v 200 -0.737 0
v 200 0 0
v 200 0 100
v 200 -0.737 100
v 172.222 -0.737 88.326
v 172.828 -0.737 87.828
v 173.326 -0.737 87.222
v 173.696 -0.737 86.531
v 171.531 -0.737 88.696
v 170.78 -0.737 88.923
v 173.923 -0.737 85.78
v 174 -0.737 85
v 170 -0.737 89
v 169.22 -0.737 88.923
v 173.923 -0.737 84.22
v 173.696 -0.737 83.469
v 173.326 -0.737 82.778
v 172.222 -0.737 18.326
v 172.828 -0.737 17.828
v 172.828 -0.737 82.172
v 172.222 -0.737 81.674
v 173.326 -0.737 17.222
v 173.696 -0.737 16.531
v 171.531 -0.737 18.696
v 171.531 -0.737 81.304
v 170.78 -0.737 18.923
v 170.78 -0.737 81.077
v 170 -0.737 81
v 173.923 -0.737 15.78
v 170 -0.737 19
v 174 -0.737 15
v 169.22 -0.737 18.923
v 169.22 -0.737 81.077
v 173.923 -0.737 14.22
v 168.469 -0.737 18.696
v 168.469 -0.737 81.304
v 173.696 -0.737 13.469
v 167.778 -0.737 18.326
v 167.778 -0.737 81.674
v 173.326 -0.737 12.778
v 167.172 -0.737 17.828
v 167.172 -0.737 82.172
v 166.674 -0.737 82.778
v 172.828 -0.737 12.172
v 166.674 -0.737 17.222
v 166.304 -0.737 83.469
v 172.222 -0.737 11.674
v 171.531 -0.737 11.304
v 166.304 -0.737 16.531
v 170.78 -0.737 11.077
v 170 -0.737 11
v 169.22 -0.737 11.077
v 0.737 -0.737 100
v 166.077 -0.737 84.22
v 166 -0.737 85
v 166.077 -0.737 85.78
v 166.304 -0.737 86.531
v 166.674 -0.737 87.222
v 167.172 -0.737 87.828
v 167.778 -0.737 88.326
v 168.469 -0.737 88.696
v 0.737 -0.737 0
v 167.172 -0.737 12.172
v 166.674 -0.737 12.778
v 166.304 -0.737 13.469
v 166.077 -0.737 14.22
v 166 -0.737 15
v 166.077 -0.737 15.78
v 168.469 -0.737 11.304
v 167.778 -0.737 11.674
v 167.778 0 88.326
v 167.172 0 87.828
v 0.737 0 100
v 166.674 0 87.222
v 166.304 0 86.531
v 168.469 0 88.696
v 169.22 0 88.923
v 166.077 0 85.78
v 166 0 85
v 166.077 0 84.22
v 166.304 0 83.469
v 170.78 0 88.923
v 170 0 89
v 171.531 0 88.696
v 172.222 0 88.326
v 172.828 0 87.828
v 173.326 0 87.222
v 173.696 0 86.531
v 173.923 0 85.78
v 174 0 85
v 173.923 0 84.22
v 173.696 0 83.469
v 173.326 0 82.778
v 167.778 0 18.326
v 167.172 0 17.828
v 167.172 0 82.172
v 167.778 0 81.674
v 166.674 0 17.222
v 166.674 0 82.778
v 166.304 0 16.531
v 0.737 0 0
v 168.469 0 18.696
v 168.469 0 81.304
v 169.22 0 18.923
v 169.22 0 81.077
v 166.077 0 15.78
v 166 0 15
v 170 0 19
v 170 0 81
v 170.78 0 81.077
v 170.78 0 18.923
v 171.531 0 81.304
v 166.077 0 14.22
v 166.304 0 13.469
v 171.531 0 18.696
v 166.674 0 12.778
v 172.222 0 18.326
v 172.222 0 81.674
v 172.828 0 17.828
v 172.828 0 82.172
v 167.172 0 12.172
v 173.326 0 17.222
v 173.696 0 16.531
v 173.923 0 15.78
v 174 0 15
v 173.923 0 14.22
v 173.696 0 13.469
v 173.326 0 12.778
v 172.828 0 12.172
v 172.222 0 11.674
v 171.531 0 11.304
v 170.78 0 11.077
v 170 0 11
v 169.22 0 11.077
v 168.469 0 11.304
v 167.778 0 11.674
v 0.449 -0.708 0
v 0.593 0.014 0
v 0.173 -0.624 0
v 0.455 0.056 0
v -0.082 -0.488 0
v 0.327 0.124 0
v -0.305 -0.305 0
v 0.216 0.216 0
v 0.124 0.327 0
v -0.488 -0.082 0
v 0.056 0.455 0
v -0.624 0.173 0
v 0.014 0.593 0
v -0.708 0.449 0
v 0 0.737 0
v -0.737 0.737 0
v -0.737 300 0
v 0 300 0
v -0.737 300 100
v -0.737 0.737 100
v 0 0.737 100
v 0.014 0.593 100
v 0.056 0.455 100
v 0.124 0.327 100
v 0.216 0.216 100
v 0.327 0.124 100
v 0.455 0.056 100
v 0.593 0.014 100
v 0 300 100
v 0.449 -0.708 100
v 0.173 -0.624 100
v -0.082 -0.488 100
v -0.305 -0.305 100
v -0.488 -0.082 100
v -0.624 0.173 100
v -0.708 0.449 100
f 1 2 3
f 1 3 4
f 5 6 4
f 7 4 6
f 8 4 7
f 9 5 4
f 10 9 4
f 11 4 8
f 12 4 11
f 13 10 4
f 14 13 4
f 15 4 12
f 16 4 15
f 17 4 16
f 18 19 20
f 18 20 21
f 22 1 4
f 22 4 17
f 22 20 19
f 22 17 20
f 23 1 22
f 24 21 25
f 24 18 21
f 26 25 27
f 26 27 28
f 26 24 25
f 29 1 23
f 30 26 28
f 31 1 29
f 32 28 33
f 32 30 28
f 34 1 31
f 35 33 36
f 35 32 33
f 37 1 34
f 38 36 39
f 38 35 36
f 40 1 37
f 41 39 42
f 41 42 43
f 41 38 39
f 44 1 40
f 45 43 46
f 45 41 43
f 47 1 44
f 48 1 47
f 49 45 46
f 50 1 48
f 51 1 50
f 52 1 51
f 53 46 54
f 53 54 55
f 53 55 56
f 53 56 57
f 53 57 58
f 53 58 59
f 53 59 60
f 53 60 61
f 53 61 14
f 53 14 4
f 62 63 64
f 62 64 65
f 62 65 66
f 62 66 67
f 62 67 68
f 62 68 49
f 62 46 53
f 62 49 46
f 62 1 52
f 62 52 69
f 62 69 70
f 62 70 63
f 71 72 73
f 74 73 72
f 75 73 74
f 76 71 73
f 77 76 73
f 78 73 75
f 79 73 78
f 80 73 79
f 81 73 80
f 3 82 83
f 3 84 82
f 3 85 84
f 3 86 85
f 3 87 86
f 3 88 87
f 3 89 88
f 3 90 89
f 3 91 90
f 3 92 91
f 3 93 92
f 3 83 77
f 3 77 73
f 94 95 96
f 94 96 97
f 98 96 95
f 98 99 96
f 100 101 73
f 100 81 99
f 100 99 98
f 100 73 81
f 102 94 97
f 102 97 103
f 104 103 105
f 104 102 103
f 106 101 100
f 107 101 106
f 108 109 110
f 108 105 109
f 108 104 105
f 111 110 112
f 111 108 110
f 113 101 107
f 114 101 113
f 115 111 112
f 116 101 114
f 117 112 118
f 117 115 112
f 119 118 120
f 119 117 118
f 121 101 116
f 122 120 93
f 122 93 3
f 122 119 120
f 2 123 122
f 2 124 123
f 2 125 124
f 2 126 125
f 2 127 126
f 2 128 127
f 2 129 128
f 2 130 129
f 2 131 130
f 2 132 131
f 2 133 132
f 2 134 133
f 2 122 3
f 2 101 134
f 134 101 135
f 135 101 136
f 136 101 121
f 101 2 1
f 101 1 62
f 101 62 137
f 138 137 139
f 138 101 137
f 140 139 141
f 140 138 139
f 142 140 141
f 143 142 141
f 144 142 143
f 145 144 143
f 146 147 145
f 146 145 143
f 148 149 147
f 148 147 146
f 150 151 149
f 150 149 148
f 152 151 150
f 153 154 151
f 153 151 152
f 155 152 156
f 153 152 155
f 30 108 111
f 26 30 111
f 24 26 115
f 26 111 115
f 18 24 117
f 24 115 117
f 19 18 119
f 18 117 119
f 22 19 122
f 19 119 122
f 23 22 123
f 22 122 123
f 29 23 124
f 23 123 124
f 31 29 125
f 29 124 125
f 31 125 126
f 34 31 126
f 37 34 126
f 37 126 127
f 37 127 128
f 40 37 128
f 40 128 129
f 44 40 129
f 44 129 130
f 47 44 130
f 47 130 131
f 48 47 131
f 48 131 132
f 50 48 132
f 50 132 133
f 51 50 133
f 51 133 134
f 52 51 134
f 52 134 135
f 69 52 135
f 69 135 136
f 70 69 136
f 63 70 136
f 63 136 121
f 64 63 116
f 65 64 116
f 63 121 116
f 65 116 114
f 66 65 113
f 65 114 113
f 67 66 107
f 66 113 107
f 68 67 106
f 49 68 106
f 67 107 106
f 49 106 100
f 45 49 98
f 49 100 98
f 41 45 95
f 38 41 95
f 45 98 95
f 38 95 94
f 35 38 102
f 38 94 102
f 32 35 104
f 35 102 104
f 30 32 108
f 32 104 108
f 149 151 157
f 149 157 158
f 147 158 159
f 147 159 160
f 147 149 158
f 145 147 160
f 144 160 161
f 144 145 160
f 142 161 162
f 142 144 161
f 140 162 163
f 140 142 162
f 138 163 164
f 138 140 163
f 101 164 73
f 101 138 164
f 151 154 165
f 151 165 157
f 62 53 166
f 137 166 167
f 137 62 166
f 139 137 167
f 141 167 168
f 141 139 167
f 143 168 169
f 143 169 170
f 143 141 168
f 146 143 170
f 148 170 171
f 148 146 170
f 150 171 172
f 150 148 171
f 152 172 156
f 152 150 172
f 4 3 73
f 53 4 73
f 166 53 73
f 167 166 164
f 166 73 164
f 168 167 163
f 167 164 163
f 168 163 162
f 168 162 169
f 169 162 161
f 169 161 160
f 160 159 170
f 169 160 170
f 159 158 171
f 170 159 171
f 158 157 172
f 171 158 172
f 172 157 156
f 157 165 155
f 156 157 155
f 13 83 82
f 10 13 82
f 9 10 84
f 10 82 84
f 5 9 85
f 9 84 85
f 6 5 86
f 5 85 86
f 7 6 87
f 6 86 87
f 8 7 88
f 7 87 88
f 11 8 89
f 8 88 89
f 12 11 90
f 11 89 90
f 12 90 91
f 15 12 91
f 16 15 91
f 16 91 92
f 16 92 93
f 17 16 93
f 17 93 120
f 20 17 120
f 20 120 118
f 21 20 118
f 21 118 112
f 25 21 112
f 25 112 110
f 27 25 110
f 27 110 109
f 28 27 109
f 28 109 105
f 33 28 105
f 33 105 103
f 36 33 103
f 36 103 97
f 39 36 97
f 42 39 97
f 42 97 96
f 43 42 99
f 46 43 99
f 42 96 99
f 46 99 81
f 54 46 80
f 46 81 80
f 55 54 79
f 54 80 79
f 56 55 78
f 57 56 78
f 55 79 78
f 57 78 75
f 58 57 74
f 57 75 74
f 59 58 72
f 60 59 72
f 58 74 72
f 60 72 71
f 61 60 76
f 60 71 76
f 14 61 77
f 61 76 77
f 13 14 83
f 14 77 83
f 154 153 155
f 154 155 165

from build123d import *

# Parameters (mm, degrees)
BASE_FLANGE1_DEPTH = 100
SKETCH6_R          = 4
CUT_EXTRUDE1_DEPTH = 10


# Sheet-metal steps are written as plain solids
with BuildPart() as part:
    # Sketch1 → Base-Flange1 (new body)
    with BuildSketch(Plane.XY):
        with BuildLine():
            Line((0, 300), (0, 0.7366))
            ThreePointArc((0, 0.7366), (0.215745145, 0.215745145), (0.7366, 0))
            Line((0.7366, 0), (200, 0))
            Line((200, 0), (200, -0.7366))
            Line((200, -0.7366), (0.7366, -0.7366))
            ThreePointArc((0.7366, -0.7366), (-0.30510971, -0.30510971), (-0.7366, 0.7366))
            Line((-0.7366, 0.7366), (-0.7366, 300))
            Line((-0.7366, 300), (0, 300))
        make_face()
    extrude(amount=BASE_FLANGE1_DEPTH)

    # Sketch6 → Cut-Extrude1 (cut)
    with BuildSketch(Plane(origin=(0, 0, 0), x_dir=(1, 0, 0), z_dir=(0, 1, 0))):
        with Locations(Location((170, -15, 0), (0, 0, 270))):
            Circle(SKETCH6_R)
        with Locations(Location((170, -85, 0), (0, 0, 270))):
            Circle(SKETCH6_R)
    extrude(amount=-CUT_EXTRUDE1_DEPTH, mode=Mode.SUBTRACT)


solid = part.part
